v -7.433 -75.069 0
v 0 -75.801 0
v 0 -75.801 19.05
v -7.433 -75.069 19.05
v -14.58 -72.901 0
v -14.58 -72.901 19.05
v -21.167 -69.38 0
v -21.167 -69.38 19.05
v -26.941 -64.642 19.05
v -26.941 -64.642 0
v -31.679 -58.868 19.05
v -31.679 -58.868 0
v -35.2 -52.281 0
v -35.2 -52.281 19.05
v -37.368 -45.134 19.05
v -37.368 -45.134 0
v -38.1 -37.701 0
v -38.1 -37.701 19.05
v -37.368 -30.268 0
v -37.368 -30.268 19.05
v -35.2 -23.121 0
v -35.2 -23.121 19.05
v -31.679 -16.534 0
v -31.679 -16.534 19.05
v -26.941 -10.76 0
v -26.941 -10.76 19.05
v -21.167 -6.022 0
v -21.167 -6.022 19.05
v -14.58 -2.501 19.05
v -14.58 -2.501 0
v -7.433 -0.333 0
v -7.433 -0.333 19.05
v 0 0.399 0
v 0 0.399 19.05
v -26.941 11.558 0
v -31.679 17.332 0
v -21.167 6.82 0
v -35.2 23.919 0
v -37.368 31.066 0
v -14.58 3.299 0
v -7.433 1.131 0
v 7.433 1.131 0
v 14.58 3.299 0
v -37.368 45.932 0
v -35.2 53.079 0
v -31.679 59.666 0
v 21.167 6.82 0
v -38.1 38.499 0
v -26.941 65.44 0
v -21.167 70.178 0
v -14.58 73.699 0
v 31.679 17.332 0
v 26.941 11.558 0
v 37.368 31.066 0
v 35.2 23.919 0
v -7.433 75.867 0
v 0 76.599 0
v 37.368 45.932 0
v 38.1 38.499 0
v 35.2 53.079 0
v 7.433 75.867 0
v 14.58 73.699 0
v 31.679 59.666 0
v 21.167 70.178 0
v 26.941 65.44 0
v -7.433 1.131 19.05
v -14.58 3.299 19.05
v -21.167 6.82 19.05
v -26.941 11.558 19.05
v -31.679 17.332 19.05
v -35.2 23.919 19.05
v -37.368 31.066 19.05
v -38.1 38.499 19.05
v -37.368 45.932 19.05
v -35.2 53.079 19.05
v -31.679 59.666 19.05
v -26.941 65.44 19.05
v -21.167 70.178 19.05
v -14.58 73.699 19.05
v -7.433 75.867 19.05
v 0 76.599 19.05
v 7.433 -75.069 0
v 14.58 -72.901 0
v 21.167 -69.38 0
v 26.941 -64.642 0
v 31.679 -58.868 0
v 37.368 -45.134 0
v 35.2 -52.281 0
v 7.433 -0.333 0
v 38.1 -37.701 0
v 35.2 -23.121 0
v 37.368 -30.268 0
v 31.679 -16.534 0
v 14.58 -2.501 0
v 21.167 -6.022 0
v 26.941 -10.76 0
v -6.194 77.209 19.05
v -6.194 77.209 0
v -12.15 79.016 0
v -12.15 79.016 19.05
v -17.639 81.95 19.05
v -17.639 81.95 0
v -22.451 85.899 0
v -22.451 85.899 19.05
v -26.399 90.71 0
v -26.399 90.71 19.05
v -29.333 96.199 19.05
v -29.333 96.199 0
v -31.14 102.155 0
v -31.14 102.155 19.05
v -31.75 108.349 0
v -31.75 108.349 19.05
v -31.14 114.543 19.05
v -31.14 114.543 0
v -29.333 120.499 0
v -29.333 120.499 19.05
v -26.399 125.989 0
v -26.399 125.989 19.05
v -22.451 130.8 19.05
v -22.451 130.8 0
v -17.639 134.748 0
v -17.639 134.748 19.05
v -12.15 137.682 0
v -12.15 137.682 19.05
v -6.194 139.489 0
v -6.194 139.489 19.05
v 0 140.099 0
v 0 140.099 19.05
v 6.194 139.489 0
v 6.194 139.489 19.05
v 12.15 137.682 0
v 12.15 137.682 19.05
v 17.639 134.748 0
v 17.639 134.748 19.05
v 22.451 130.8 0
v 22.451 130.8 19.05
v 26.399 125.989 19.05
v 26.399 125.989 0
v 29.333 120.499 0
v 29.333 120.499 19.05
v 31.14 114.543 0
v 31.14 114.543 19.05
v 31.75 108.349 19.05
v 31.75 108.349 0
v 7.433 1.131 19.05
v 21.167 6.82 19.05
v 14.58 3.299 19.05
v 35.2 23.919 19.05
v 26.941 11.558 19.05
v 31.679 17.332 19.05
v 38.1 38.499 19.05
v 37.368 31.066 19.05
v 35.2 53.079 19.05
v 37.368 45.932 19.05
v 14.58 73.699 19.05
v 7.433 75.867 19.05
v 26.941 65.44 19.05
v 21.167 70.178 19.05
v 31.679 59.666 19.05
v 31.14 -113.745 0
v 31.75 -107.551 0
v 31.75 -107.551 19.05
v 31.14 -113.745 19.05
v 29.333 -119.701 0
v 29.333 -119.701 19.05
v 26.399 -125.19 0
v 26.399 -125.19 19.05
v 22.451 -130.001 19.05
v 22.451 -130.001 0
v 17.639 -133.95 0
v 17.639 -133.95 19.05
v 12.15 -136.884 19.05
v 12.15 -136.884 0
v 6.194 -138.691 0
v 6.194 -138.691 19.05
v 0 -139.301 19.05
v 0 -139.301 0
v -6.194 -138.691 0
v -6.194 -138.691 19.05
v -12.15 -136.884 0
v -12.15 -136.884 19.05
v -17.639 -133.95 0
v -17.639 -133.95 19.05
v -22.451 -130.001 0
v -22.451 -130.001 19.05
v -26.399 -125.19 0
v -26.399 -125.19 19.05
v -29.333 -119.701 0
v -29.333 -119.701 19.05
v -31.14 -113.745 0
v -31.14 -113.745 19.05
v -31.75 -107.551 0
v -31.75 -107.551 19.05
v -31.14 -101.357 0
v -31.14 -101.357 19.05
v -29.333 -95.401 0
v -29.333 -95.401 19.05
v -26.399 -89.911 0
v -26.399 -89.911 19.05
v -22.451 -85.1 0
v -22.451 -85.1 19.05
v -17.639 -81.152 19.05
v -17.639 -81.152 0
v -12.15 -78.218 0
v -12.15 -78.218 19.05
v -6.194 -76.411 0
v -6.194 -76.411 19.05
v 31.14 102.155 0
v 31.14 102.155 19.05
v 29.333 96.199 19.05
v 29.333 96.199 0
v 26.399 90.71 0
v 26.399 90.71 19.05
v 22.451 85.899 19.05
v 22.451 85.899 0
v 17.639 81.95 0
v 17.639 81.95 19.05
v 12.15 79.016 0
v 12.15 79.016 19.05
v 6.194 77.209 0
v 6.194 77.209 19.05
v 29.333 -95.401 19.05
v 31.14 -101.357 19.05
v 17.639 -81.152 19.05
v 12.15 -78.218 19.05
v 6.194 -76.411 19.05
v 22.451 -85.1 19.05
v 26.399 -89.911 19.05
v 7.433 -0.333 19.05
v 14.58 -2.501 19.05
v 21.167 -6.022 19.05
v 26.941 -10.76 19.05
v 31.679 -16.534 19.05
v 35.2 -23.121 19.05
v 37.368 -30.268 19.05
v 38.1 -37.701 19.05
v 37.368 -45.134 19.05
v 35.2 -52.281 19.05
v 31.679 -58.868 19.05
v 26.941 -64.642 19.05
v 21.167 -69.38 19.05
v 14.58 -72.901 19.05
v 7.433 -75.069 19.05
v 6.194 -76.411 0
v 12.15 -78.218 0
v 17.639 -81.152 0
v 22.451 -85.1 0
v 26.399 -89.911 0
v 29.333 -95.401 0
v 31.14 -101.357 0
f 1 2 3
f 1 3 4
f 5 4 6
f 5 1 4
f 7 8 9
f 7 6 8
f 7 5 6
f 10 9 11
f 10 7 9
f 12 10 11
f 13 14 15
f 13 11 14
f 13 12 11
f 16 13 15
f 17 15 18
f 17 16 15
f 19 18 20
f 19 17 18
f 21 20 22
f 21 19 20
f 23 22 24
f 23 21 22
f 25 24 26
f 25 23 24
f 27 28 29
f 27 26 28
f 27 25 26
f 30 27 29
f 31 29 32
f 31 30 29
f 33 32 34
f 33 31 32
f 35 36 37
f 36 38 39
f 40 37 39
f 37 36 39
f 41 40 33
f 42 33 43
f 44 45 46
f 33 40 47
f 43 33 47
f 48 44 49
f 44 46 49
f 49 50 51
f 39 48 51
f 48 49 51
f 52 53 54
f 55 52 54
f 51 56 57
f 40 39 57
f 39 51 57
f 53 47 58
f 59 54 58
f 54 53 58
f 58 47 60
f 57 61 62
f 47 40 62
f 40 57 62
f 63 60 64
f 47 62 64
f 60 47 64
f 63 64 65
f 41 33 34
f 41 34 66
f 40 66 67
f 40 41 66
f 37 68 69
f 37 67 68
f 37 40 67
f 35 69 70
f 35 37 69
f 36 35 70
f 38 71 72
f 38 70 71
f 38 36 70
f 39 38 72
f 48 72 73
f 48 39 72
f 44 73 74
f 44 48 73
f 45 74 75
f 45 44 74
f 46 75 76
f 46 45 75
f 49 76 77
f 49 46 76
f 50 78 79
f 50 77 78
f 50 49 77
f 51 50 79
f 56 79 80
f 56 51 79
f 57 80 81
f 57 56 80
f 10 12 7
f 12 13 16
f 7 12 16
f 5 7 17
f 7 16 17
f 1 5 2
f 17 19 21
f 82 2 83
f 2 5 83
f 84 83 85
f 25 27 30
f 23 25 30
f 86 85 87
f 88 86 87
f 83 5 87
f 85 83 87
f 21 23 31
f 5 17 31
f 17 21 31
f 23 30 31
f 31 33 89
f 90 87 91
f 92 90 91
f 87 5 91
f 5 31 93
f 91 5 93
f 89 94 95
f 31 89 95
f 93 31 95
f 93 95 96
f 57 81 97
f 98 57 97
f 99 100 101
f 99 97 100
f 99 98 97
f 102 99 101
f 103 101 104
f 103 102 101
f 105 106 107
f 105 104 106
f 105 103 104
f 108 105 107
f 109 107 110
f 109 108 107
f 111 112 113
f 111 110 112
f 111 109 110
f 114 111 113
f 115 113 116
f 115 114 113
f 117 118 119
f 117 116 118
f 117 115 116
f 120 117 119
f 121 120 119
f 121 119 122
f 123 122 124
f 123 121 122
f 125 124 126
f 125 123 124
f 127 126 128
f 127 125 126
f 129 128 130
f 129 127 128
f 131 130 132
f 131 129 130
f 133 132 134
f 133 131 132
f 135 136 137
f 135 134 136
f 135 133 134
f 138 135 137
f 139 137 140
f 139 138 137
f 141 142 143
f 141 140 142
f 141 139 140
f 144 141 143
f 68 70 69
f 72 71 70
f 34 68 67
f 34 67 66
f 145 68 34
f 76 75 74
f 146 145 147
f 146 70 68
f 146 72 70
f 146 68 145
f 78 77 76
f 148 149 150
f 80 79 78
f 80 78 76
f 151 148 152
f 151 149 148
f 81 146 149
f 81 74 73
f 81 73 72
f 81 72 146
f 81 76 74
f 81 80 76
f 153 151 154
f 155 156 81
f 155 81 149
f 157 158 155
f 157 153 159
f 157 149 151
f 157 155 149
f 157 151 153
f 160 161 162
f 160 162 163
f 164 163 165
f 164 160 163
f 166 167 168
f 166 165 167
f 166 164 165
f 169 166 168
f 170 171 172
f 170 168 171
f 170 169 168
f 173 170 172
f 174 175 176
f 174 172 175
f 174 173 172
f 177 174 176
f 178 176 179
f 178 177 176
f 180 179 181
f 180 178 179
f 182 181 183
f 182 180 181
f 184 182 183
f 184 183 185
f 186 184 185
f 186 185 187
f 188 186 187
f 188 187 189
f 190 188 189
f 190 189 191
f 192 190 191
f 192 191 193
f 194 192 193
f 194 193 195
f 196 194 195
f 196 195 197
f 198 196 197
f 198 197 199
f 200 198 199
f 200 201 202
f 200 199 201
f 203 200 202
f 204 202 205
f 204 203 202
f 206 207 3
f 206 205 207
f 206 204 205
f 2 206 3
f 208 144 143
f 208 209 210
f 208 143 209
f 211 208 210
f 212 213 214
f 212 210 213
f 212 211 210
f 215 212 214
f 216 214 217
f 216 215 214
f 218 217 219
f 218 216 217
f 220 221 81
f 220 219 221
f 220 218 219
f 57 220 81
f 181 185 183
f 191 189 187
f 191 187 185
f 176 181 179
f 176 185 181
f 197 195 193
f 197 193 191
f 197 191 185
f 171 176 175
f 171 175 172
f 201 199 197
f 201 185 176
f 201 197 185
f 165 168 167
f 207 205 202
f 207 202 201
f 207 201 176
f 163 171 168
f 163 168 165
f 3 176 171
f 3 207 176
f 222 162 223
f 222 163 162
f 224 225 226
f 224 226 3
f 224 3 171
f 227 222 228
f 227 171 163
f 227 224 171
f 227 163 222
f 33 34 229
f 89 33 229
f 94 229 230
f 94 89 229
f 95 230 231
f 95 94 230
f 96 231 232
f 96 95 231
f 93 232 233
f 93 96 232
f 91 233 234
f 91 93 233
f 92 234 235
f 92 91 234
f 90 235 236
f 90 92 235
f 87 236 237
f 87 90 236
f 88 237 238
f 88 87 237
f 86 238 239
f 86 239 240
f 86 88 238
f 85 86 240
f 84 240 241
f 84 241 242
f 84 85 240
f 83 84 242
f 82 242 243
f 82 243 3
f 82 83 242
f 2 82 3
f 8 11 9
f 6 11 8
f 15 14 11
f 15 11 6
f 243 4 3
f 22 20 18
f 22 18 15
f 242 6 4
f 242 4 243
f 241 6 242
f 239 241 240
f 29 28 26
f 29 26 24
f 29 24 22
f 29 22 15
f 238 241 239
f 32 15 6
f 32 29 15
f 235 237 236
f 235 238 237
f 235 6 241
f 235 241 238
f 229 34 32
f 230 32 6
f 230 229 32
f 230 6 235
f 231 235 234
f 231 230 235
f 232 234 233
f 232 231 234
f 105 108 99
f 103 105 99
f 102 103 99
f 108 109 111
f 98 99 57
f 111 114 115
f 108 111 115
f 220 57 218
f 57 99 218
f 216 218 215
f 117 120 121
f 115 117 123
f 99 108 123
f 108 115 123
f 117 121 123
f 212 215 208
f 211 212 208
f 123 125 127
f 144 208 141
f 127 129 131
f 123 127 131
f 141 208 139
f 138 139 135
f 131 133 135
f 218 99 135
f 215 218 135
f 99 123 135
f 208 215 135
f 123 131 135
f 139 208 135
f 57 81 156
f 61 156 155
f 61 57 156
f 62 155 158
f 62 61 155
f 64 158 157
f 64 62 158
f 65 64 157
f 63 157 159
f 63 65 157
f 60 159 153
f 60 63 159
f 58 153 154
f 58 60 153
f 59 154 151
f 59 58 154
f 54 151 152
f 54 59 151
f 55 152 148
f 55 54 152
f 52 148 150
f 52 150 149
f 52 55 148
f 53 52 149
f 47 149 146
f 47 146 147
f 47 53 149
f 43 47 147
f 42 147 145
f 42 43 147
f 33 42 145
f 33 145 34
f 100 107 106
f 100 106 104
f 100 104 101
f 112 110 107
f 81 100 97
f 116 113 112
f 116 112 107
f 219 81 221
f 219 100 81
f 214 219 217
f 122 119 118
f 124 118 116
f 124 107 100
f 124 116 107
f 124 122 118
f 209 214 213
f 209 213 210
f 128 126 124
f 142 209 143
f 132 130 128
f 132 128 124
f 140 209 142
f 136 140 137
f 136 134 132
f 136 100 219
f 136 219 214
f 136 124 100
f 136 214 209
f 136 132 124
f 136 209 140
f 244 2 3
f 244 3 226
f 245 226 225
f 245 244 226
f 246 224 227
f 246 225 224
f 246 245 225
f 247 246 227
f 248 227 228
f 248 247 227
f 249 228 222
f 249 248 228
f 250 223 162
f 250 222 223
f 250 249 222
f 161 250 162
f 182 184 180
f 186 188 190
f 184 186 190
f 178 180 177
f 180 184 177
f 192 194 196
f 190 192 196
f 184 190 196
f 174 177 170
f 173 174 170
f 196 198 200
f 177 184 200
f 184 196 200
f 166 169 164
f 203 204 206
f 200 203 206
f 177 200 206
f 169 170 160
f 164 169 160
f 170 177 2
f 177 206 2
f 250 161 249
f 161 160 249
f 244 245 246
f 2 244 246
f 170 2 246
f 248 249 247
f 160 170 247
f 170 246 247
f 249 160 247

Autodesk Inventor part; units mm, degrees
ref_plane "YZ Plane" through (0, 0, 0) normal (1, 0, 0) x (0, 1, 0)
ref_plane "XZ Plane" through (0, 0, 0) normal (0, 1, 0) x (-1, 0, 0)
ref_plane "XY Plane" through (0, 0, 0) normal (0, 0, 1) x (1, 0, 0)
ref_plane "Work Plane1" through (0, 0, 0) normal (0, 0, 1) x (1, 0, 0)
sketch "Sketch1" plane through (0, 0, 0) normal (0, 0, 1) x (1, 0, 0)
  circle A0 centre (0, -107.5508) radius 31.75 projected
  circle A1 centre (0, 108.3492) radius 31.75 projected
  circle A2 centre (0, 38.4992) radius 38.1 projected
  circle A3 centre (0, -37.7008) radius 38.1 projected
  point P0 (0, 0)
  point P1 (0, -75.8008)
  point P2 (0, 0.3992)
  point P3 (0, 76.5992)
extrude "Extrusion1" add sketch "Sketch1" along normal blind 19.05
properties part number "gearTemplate"
